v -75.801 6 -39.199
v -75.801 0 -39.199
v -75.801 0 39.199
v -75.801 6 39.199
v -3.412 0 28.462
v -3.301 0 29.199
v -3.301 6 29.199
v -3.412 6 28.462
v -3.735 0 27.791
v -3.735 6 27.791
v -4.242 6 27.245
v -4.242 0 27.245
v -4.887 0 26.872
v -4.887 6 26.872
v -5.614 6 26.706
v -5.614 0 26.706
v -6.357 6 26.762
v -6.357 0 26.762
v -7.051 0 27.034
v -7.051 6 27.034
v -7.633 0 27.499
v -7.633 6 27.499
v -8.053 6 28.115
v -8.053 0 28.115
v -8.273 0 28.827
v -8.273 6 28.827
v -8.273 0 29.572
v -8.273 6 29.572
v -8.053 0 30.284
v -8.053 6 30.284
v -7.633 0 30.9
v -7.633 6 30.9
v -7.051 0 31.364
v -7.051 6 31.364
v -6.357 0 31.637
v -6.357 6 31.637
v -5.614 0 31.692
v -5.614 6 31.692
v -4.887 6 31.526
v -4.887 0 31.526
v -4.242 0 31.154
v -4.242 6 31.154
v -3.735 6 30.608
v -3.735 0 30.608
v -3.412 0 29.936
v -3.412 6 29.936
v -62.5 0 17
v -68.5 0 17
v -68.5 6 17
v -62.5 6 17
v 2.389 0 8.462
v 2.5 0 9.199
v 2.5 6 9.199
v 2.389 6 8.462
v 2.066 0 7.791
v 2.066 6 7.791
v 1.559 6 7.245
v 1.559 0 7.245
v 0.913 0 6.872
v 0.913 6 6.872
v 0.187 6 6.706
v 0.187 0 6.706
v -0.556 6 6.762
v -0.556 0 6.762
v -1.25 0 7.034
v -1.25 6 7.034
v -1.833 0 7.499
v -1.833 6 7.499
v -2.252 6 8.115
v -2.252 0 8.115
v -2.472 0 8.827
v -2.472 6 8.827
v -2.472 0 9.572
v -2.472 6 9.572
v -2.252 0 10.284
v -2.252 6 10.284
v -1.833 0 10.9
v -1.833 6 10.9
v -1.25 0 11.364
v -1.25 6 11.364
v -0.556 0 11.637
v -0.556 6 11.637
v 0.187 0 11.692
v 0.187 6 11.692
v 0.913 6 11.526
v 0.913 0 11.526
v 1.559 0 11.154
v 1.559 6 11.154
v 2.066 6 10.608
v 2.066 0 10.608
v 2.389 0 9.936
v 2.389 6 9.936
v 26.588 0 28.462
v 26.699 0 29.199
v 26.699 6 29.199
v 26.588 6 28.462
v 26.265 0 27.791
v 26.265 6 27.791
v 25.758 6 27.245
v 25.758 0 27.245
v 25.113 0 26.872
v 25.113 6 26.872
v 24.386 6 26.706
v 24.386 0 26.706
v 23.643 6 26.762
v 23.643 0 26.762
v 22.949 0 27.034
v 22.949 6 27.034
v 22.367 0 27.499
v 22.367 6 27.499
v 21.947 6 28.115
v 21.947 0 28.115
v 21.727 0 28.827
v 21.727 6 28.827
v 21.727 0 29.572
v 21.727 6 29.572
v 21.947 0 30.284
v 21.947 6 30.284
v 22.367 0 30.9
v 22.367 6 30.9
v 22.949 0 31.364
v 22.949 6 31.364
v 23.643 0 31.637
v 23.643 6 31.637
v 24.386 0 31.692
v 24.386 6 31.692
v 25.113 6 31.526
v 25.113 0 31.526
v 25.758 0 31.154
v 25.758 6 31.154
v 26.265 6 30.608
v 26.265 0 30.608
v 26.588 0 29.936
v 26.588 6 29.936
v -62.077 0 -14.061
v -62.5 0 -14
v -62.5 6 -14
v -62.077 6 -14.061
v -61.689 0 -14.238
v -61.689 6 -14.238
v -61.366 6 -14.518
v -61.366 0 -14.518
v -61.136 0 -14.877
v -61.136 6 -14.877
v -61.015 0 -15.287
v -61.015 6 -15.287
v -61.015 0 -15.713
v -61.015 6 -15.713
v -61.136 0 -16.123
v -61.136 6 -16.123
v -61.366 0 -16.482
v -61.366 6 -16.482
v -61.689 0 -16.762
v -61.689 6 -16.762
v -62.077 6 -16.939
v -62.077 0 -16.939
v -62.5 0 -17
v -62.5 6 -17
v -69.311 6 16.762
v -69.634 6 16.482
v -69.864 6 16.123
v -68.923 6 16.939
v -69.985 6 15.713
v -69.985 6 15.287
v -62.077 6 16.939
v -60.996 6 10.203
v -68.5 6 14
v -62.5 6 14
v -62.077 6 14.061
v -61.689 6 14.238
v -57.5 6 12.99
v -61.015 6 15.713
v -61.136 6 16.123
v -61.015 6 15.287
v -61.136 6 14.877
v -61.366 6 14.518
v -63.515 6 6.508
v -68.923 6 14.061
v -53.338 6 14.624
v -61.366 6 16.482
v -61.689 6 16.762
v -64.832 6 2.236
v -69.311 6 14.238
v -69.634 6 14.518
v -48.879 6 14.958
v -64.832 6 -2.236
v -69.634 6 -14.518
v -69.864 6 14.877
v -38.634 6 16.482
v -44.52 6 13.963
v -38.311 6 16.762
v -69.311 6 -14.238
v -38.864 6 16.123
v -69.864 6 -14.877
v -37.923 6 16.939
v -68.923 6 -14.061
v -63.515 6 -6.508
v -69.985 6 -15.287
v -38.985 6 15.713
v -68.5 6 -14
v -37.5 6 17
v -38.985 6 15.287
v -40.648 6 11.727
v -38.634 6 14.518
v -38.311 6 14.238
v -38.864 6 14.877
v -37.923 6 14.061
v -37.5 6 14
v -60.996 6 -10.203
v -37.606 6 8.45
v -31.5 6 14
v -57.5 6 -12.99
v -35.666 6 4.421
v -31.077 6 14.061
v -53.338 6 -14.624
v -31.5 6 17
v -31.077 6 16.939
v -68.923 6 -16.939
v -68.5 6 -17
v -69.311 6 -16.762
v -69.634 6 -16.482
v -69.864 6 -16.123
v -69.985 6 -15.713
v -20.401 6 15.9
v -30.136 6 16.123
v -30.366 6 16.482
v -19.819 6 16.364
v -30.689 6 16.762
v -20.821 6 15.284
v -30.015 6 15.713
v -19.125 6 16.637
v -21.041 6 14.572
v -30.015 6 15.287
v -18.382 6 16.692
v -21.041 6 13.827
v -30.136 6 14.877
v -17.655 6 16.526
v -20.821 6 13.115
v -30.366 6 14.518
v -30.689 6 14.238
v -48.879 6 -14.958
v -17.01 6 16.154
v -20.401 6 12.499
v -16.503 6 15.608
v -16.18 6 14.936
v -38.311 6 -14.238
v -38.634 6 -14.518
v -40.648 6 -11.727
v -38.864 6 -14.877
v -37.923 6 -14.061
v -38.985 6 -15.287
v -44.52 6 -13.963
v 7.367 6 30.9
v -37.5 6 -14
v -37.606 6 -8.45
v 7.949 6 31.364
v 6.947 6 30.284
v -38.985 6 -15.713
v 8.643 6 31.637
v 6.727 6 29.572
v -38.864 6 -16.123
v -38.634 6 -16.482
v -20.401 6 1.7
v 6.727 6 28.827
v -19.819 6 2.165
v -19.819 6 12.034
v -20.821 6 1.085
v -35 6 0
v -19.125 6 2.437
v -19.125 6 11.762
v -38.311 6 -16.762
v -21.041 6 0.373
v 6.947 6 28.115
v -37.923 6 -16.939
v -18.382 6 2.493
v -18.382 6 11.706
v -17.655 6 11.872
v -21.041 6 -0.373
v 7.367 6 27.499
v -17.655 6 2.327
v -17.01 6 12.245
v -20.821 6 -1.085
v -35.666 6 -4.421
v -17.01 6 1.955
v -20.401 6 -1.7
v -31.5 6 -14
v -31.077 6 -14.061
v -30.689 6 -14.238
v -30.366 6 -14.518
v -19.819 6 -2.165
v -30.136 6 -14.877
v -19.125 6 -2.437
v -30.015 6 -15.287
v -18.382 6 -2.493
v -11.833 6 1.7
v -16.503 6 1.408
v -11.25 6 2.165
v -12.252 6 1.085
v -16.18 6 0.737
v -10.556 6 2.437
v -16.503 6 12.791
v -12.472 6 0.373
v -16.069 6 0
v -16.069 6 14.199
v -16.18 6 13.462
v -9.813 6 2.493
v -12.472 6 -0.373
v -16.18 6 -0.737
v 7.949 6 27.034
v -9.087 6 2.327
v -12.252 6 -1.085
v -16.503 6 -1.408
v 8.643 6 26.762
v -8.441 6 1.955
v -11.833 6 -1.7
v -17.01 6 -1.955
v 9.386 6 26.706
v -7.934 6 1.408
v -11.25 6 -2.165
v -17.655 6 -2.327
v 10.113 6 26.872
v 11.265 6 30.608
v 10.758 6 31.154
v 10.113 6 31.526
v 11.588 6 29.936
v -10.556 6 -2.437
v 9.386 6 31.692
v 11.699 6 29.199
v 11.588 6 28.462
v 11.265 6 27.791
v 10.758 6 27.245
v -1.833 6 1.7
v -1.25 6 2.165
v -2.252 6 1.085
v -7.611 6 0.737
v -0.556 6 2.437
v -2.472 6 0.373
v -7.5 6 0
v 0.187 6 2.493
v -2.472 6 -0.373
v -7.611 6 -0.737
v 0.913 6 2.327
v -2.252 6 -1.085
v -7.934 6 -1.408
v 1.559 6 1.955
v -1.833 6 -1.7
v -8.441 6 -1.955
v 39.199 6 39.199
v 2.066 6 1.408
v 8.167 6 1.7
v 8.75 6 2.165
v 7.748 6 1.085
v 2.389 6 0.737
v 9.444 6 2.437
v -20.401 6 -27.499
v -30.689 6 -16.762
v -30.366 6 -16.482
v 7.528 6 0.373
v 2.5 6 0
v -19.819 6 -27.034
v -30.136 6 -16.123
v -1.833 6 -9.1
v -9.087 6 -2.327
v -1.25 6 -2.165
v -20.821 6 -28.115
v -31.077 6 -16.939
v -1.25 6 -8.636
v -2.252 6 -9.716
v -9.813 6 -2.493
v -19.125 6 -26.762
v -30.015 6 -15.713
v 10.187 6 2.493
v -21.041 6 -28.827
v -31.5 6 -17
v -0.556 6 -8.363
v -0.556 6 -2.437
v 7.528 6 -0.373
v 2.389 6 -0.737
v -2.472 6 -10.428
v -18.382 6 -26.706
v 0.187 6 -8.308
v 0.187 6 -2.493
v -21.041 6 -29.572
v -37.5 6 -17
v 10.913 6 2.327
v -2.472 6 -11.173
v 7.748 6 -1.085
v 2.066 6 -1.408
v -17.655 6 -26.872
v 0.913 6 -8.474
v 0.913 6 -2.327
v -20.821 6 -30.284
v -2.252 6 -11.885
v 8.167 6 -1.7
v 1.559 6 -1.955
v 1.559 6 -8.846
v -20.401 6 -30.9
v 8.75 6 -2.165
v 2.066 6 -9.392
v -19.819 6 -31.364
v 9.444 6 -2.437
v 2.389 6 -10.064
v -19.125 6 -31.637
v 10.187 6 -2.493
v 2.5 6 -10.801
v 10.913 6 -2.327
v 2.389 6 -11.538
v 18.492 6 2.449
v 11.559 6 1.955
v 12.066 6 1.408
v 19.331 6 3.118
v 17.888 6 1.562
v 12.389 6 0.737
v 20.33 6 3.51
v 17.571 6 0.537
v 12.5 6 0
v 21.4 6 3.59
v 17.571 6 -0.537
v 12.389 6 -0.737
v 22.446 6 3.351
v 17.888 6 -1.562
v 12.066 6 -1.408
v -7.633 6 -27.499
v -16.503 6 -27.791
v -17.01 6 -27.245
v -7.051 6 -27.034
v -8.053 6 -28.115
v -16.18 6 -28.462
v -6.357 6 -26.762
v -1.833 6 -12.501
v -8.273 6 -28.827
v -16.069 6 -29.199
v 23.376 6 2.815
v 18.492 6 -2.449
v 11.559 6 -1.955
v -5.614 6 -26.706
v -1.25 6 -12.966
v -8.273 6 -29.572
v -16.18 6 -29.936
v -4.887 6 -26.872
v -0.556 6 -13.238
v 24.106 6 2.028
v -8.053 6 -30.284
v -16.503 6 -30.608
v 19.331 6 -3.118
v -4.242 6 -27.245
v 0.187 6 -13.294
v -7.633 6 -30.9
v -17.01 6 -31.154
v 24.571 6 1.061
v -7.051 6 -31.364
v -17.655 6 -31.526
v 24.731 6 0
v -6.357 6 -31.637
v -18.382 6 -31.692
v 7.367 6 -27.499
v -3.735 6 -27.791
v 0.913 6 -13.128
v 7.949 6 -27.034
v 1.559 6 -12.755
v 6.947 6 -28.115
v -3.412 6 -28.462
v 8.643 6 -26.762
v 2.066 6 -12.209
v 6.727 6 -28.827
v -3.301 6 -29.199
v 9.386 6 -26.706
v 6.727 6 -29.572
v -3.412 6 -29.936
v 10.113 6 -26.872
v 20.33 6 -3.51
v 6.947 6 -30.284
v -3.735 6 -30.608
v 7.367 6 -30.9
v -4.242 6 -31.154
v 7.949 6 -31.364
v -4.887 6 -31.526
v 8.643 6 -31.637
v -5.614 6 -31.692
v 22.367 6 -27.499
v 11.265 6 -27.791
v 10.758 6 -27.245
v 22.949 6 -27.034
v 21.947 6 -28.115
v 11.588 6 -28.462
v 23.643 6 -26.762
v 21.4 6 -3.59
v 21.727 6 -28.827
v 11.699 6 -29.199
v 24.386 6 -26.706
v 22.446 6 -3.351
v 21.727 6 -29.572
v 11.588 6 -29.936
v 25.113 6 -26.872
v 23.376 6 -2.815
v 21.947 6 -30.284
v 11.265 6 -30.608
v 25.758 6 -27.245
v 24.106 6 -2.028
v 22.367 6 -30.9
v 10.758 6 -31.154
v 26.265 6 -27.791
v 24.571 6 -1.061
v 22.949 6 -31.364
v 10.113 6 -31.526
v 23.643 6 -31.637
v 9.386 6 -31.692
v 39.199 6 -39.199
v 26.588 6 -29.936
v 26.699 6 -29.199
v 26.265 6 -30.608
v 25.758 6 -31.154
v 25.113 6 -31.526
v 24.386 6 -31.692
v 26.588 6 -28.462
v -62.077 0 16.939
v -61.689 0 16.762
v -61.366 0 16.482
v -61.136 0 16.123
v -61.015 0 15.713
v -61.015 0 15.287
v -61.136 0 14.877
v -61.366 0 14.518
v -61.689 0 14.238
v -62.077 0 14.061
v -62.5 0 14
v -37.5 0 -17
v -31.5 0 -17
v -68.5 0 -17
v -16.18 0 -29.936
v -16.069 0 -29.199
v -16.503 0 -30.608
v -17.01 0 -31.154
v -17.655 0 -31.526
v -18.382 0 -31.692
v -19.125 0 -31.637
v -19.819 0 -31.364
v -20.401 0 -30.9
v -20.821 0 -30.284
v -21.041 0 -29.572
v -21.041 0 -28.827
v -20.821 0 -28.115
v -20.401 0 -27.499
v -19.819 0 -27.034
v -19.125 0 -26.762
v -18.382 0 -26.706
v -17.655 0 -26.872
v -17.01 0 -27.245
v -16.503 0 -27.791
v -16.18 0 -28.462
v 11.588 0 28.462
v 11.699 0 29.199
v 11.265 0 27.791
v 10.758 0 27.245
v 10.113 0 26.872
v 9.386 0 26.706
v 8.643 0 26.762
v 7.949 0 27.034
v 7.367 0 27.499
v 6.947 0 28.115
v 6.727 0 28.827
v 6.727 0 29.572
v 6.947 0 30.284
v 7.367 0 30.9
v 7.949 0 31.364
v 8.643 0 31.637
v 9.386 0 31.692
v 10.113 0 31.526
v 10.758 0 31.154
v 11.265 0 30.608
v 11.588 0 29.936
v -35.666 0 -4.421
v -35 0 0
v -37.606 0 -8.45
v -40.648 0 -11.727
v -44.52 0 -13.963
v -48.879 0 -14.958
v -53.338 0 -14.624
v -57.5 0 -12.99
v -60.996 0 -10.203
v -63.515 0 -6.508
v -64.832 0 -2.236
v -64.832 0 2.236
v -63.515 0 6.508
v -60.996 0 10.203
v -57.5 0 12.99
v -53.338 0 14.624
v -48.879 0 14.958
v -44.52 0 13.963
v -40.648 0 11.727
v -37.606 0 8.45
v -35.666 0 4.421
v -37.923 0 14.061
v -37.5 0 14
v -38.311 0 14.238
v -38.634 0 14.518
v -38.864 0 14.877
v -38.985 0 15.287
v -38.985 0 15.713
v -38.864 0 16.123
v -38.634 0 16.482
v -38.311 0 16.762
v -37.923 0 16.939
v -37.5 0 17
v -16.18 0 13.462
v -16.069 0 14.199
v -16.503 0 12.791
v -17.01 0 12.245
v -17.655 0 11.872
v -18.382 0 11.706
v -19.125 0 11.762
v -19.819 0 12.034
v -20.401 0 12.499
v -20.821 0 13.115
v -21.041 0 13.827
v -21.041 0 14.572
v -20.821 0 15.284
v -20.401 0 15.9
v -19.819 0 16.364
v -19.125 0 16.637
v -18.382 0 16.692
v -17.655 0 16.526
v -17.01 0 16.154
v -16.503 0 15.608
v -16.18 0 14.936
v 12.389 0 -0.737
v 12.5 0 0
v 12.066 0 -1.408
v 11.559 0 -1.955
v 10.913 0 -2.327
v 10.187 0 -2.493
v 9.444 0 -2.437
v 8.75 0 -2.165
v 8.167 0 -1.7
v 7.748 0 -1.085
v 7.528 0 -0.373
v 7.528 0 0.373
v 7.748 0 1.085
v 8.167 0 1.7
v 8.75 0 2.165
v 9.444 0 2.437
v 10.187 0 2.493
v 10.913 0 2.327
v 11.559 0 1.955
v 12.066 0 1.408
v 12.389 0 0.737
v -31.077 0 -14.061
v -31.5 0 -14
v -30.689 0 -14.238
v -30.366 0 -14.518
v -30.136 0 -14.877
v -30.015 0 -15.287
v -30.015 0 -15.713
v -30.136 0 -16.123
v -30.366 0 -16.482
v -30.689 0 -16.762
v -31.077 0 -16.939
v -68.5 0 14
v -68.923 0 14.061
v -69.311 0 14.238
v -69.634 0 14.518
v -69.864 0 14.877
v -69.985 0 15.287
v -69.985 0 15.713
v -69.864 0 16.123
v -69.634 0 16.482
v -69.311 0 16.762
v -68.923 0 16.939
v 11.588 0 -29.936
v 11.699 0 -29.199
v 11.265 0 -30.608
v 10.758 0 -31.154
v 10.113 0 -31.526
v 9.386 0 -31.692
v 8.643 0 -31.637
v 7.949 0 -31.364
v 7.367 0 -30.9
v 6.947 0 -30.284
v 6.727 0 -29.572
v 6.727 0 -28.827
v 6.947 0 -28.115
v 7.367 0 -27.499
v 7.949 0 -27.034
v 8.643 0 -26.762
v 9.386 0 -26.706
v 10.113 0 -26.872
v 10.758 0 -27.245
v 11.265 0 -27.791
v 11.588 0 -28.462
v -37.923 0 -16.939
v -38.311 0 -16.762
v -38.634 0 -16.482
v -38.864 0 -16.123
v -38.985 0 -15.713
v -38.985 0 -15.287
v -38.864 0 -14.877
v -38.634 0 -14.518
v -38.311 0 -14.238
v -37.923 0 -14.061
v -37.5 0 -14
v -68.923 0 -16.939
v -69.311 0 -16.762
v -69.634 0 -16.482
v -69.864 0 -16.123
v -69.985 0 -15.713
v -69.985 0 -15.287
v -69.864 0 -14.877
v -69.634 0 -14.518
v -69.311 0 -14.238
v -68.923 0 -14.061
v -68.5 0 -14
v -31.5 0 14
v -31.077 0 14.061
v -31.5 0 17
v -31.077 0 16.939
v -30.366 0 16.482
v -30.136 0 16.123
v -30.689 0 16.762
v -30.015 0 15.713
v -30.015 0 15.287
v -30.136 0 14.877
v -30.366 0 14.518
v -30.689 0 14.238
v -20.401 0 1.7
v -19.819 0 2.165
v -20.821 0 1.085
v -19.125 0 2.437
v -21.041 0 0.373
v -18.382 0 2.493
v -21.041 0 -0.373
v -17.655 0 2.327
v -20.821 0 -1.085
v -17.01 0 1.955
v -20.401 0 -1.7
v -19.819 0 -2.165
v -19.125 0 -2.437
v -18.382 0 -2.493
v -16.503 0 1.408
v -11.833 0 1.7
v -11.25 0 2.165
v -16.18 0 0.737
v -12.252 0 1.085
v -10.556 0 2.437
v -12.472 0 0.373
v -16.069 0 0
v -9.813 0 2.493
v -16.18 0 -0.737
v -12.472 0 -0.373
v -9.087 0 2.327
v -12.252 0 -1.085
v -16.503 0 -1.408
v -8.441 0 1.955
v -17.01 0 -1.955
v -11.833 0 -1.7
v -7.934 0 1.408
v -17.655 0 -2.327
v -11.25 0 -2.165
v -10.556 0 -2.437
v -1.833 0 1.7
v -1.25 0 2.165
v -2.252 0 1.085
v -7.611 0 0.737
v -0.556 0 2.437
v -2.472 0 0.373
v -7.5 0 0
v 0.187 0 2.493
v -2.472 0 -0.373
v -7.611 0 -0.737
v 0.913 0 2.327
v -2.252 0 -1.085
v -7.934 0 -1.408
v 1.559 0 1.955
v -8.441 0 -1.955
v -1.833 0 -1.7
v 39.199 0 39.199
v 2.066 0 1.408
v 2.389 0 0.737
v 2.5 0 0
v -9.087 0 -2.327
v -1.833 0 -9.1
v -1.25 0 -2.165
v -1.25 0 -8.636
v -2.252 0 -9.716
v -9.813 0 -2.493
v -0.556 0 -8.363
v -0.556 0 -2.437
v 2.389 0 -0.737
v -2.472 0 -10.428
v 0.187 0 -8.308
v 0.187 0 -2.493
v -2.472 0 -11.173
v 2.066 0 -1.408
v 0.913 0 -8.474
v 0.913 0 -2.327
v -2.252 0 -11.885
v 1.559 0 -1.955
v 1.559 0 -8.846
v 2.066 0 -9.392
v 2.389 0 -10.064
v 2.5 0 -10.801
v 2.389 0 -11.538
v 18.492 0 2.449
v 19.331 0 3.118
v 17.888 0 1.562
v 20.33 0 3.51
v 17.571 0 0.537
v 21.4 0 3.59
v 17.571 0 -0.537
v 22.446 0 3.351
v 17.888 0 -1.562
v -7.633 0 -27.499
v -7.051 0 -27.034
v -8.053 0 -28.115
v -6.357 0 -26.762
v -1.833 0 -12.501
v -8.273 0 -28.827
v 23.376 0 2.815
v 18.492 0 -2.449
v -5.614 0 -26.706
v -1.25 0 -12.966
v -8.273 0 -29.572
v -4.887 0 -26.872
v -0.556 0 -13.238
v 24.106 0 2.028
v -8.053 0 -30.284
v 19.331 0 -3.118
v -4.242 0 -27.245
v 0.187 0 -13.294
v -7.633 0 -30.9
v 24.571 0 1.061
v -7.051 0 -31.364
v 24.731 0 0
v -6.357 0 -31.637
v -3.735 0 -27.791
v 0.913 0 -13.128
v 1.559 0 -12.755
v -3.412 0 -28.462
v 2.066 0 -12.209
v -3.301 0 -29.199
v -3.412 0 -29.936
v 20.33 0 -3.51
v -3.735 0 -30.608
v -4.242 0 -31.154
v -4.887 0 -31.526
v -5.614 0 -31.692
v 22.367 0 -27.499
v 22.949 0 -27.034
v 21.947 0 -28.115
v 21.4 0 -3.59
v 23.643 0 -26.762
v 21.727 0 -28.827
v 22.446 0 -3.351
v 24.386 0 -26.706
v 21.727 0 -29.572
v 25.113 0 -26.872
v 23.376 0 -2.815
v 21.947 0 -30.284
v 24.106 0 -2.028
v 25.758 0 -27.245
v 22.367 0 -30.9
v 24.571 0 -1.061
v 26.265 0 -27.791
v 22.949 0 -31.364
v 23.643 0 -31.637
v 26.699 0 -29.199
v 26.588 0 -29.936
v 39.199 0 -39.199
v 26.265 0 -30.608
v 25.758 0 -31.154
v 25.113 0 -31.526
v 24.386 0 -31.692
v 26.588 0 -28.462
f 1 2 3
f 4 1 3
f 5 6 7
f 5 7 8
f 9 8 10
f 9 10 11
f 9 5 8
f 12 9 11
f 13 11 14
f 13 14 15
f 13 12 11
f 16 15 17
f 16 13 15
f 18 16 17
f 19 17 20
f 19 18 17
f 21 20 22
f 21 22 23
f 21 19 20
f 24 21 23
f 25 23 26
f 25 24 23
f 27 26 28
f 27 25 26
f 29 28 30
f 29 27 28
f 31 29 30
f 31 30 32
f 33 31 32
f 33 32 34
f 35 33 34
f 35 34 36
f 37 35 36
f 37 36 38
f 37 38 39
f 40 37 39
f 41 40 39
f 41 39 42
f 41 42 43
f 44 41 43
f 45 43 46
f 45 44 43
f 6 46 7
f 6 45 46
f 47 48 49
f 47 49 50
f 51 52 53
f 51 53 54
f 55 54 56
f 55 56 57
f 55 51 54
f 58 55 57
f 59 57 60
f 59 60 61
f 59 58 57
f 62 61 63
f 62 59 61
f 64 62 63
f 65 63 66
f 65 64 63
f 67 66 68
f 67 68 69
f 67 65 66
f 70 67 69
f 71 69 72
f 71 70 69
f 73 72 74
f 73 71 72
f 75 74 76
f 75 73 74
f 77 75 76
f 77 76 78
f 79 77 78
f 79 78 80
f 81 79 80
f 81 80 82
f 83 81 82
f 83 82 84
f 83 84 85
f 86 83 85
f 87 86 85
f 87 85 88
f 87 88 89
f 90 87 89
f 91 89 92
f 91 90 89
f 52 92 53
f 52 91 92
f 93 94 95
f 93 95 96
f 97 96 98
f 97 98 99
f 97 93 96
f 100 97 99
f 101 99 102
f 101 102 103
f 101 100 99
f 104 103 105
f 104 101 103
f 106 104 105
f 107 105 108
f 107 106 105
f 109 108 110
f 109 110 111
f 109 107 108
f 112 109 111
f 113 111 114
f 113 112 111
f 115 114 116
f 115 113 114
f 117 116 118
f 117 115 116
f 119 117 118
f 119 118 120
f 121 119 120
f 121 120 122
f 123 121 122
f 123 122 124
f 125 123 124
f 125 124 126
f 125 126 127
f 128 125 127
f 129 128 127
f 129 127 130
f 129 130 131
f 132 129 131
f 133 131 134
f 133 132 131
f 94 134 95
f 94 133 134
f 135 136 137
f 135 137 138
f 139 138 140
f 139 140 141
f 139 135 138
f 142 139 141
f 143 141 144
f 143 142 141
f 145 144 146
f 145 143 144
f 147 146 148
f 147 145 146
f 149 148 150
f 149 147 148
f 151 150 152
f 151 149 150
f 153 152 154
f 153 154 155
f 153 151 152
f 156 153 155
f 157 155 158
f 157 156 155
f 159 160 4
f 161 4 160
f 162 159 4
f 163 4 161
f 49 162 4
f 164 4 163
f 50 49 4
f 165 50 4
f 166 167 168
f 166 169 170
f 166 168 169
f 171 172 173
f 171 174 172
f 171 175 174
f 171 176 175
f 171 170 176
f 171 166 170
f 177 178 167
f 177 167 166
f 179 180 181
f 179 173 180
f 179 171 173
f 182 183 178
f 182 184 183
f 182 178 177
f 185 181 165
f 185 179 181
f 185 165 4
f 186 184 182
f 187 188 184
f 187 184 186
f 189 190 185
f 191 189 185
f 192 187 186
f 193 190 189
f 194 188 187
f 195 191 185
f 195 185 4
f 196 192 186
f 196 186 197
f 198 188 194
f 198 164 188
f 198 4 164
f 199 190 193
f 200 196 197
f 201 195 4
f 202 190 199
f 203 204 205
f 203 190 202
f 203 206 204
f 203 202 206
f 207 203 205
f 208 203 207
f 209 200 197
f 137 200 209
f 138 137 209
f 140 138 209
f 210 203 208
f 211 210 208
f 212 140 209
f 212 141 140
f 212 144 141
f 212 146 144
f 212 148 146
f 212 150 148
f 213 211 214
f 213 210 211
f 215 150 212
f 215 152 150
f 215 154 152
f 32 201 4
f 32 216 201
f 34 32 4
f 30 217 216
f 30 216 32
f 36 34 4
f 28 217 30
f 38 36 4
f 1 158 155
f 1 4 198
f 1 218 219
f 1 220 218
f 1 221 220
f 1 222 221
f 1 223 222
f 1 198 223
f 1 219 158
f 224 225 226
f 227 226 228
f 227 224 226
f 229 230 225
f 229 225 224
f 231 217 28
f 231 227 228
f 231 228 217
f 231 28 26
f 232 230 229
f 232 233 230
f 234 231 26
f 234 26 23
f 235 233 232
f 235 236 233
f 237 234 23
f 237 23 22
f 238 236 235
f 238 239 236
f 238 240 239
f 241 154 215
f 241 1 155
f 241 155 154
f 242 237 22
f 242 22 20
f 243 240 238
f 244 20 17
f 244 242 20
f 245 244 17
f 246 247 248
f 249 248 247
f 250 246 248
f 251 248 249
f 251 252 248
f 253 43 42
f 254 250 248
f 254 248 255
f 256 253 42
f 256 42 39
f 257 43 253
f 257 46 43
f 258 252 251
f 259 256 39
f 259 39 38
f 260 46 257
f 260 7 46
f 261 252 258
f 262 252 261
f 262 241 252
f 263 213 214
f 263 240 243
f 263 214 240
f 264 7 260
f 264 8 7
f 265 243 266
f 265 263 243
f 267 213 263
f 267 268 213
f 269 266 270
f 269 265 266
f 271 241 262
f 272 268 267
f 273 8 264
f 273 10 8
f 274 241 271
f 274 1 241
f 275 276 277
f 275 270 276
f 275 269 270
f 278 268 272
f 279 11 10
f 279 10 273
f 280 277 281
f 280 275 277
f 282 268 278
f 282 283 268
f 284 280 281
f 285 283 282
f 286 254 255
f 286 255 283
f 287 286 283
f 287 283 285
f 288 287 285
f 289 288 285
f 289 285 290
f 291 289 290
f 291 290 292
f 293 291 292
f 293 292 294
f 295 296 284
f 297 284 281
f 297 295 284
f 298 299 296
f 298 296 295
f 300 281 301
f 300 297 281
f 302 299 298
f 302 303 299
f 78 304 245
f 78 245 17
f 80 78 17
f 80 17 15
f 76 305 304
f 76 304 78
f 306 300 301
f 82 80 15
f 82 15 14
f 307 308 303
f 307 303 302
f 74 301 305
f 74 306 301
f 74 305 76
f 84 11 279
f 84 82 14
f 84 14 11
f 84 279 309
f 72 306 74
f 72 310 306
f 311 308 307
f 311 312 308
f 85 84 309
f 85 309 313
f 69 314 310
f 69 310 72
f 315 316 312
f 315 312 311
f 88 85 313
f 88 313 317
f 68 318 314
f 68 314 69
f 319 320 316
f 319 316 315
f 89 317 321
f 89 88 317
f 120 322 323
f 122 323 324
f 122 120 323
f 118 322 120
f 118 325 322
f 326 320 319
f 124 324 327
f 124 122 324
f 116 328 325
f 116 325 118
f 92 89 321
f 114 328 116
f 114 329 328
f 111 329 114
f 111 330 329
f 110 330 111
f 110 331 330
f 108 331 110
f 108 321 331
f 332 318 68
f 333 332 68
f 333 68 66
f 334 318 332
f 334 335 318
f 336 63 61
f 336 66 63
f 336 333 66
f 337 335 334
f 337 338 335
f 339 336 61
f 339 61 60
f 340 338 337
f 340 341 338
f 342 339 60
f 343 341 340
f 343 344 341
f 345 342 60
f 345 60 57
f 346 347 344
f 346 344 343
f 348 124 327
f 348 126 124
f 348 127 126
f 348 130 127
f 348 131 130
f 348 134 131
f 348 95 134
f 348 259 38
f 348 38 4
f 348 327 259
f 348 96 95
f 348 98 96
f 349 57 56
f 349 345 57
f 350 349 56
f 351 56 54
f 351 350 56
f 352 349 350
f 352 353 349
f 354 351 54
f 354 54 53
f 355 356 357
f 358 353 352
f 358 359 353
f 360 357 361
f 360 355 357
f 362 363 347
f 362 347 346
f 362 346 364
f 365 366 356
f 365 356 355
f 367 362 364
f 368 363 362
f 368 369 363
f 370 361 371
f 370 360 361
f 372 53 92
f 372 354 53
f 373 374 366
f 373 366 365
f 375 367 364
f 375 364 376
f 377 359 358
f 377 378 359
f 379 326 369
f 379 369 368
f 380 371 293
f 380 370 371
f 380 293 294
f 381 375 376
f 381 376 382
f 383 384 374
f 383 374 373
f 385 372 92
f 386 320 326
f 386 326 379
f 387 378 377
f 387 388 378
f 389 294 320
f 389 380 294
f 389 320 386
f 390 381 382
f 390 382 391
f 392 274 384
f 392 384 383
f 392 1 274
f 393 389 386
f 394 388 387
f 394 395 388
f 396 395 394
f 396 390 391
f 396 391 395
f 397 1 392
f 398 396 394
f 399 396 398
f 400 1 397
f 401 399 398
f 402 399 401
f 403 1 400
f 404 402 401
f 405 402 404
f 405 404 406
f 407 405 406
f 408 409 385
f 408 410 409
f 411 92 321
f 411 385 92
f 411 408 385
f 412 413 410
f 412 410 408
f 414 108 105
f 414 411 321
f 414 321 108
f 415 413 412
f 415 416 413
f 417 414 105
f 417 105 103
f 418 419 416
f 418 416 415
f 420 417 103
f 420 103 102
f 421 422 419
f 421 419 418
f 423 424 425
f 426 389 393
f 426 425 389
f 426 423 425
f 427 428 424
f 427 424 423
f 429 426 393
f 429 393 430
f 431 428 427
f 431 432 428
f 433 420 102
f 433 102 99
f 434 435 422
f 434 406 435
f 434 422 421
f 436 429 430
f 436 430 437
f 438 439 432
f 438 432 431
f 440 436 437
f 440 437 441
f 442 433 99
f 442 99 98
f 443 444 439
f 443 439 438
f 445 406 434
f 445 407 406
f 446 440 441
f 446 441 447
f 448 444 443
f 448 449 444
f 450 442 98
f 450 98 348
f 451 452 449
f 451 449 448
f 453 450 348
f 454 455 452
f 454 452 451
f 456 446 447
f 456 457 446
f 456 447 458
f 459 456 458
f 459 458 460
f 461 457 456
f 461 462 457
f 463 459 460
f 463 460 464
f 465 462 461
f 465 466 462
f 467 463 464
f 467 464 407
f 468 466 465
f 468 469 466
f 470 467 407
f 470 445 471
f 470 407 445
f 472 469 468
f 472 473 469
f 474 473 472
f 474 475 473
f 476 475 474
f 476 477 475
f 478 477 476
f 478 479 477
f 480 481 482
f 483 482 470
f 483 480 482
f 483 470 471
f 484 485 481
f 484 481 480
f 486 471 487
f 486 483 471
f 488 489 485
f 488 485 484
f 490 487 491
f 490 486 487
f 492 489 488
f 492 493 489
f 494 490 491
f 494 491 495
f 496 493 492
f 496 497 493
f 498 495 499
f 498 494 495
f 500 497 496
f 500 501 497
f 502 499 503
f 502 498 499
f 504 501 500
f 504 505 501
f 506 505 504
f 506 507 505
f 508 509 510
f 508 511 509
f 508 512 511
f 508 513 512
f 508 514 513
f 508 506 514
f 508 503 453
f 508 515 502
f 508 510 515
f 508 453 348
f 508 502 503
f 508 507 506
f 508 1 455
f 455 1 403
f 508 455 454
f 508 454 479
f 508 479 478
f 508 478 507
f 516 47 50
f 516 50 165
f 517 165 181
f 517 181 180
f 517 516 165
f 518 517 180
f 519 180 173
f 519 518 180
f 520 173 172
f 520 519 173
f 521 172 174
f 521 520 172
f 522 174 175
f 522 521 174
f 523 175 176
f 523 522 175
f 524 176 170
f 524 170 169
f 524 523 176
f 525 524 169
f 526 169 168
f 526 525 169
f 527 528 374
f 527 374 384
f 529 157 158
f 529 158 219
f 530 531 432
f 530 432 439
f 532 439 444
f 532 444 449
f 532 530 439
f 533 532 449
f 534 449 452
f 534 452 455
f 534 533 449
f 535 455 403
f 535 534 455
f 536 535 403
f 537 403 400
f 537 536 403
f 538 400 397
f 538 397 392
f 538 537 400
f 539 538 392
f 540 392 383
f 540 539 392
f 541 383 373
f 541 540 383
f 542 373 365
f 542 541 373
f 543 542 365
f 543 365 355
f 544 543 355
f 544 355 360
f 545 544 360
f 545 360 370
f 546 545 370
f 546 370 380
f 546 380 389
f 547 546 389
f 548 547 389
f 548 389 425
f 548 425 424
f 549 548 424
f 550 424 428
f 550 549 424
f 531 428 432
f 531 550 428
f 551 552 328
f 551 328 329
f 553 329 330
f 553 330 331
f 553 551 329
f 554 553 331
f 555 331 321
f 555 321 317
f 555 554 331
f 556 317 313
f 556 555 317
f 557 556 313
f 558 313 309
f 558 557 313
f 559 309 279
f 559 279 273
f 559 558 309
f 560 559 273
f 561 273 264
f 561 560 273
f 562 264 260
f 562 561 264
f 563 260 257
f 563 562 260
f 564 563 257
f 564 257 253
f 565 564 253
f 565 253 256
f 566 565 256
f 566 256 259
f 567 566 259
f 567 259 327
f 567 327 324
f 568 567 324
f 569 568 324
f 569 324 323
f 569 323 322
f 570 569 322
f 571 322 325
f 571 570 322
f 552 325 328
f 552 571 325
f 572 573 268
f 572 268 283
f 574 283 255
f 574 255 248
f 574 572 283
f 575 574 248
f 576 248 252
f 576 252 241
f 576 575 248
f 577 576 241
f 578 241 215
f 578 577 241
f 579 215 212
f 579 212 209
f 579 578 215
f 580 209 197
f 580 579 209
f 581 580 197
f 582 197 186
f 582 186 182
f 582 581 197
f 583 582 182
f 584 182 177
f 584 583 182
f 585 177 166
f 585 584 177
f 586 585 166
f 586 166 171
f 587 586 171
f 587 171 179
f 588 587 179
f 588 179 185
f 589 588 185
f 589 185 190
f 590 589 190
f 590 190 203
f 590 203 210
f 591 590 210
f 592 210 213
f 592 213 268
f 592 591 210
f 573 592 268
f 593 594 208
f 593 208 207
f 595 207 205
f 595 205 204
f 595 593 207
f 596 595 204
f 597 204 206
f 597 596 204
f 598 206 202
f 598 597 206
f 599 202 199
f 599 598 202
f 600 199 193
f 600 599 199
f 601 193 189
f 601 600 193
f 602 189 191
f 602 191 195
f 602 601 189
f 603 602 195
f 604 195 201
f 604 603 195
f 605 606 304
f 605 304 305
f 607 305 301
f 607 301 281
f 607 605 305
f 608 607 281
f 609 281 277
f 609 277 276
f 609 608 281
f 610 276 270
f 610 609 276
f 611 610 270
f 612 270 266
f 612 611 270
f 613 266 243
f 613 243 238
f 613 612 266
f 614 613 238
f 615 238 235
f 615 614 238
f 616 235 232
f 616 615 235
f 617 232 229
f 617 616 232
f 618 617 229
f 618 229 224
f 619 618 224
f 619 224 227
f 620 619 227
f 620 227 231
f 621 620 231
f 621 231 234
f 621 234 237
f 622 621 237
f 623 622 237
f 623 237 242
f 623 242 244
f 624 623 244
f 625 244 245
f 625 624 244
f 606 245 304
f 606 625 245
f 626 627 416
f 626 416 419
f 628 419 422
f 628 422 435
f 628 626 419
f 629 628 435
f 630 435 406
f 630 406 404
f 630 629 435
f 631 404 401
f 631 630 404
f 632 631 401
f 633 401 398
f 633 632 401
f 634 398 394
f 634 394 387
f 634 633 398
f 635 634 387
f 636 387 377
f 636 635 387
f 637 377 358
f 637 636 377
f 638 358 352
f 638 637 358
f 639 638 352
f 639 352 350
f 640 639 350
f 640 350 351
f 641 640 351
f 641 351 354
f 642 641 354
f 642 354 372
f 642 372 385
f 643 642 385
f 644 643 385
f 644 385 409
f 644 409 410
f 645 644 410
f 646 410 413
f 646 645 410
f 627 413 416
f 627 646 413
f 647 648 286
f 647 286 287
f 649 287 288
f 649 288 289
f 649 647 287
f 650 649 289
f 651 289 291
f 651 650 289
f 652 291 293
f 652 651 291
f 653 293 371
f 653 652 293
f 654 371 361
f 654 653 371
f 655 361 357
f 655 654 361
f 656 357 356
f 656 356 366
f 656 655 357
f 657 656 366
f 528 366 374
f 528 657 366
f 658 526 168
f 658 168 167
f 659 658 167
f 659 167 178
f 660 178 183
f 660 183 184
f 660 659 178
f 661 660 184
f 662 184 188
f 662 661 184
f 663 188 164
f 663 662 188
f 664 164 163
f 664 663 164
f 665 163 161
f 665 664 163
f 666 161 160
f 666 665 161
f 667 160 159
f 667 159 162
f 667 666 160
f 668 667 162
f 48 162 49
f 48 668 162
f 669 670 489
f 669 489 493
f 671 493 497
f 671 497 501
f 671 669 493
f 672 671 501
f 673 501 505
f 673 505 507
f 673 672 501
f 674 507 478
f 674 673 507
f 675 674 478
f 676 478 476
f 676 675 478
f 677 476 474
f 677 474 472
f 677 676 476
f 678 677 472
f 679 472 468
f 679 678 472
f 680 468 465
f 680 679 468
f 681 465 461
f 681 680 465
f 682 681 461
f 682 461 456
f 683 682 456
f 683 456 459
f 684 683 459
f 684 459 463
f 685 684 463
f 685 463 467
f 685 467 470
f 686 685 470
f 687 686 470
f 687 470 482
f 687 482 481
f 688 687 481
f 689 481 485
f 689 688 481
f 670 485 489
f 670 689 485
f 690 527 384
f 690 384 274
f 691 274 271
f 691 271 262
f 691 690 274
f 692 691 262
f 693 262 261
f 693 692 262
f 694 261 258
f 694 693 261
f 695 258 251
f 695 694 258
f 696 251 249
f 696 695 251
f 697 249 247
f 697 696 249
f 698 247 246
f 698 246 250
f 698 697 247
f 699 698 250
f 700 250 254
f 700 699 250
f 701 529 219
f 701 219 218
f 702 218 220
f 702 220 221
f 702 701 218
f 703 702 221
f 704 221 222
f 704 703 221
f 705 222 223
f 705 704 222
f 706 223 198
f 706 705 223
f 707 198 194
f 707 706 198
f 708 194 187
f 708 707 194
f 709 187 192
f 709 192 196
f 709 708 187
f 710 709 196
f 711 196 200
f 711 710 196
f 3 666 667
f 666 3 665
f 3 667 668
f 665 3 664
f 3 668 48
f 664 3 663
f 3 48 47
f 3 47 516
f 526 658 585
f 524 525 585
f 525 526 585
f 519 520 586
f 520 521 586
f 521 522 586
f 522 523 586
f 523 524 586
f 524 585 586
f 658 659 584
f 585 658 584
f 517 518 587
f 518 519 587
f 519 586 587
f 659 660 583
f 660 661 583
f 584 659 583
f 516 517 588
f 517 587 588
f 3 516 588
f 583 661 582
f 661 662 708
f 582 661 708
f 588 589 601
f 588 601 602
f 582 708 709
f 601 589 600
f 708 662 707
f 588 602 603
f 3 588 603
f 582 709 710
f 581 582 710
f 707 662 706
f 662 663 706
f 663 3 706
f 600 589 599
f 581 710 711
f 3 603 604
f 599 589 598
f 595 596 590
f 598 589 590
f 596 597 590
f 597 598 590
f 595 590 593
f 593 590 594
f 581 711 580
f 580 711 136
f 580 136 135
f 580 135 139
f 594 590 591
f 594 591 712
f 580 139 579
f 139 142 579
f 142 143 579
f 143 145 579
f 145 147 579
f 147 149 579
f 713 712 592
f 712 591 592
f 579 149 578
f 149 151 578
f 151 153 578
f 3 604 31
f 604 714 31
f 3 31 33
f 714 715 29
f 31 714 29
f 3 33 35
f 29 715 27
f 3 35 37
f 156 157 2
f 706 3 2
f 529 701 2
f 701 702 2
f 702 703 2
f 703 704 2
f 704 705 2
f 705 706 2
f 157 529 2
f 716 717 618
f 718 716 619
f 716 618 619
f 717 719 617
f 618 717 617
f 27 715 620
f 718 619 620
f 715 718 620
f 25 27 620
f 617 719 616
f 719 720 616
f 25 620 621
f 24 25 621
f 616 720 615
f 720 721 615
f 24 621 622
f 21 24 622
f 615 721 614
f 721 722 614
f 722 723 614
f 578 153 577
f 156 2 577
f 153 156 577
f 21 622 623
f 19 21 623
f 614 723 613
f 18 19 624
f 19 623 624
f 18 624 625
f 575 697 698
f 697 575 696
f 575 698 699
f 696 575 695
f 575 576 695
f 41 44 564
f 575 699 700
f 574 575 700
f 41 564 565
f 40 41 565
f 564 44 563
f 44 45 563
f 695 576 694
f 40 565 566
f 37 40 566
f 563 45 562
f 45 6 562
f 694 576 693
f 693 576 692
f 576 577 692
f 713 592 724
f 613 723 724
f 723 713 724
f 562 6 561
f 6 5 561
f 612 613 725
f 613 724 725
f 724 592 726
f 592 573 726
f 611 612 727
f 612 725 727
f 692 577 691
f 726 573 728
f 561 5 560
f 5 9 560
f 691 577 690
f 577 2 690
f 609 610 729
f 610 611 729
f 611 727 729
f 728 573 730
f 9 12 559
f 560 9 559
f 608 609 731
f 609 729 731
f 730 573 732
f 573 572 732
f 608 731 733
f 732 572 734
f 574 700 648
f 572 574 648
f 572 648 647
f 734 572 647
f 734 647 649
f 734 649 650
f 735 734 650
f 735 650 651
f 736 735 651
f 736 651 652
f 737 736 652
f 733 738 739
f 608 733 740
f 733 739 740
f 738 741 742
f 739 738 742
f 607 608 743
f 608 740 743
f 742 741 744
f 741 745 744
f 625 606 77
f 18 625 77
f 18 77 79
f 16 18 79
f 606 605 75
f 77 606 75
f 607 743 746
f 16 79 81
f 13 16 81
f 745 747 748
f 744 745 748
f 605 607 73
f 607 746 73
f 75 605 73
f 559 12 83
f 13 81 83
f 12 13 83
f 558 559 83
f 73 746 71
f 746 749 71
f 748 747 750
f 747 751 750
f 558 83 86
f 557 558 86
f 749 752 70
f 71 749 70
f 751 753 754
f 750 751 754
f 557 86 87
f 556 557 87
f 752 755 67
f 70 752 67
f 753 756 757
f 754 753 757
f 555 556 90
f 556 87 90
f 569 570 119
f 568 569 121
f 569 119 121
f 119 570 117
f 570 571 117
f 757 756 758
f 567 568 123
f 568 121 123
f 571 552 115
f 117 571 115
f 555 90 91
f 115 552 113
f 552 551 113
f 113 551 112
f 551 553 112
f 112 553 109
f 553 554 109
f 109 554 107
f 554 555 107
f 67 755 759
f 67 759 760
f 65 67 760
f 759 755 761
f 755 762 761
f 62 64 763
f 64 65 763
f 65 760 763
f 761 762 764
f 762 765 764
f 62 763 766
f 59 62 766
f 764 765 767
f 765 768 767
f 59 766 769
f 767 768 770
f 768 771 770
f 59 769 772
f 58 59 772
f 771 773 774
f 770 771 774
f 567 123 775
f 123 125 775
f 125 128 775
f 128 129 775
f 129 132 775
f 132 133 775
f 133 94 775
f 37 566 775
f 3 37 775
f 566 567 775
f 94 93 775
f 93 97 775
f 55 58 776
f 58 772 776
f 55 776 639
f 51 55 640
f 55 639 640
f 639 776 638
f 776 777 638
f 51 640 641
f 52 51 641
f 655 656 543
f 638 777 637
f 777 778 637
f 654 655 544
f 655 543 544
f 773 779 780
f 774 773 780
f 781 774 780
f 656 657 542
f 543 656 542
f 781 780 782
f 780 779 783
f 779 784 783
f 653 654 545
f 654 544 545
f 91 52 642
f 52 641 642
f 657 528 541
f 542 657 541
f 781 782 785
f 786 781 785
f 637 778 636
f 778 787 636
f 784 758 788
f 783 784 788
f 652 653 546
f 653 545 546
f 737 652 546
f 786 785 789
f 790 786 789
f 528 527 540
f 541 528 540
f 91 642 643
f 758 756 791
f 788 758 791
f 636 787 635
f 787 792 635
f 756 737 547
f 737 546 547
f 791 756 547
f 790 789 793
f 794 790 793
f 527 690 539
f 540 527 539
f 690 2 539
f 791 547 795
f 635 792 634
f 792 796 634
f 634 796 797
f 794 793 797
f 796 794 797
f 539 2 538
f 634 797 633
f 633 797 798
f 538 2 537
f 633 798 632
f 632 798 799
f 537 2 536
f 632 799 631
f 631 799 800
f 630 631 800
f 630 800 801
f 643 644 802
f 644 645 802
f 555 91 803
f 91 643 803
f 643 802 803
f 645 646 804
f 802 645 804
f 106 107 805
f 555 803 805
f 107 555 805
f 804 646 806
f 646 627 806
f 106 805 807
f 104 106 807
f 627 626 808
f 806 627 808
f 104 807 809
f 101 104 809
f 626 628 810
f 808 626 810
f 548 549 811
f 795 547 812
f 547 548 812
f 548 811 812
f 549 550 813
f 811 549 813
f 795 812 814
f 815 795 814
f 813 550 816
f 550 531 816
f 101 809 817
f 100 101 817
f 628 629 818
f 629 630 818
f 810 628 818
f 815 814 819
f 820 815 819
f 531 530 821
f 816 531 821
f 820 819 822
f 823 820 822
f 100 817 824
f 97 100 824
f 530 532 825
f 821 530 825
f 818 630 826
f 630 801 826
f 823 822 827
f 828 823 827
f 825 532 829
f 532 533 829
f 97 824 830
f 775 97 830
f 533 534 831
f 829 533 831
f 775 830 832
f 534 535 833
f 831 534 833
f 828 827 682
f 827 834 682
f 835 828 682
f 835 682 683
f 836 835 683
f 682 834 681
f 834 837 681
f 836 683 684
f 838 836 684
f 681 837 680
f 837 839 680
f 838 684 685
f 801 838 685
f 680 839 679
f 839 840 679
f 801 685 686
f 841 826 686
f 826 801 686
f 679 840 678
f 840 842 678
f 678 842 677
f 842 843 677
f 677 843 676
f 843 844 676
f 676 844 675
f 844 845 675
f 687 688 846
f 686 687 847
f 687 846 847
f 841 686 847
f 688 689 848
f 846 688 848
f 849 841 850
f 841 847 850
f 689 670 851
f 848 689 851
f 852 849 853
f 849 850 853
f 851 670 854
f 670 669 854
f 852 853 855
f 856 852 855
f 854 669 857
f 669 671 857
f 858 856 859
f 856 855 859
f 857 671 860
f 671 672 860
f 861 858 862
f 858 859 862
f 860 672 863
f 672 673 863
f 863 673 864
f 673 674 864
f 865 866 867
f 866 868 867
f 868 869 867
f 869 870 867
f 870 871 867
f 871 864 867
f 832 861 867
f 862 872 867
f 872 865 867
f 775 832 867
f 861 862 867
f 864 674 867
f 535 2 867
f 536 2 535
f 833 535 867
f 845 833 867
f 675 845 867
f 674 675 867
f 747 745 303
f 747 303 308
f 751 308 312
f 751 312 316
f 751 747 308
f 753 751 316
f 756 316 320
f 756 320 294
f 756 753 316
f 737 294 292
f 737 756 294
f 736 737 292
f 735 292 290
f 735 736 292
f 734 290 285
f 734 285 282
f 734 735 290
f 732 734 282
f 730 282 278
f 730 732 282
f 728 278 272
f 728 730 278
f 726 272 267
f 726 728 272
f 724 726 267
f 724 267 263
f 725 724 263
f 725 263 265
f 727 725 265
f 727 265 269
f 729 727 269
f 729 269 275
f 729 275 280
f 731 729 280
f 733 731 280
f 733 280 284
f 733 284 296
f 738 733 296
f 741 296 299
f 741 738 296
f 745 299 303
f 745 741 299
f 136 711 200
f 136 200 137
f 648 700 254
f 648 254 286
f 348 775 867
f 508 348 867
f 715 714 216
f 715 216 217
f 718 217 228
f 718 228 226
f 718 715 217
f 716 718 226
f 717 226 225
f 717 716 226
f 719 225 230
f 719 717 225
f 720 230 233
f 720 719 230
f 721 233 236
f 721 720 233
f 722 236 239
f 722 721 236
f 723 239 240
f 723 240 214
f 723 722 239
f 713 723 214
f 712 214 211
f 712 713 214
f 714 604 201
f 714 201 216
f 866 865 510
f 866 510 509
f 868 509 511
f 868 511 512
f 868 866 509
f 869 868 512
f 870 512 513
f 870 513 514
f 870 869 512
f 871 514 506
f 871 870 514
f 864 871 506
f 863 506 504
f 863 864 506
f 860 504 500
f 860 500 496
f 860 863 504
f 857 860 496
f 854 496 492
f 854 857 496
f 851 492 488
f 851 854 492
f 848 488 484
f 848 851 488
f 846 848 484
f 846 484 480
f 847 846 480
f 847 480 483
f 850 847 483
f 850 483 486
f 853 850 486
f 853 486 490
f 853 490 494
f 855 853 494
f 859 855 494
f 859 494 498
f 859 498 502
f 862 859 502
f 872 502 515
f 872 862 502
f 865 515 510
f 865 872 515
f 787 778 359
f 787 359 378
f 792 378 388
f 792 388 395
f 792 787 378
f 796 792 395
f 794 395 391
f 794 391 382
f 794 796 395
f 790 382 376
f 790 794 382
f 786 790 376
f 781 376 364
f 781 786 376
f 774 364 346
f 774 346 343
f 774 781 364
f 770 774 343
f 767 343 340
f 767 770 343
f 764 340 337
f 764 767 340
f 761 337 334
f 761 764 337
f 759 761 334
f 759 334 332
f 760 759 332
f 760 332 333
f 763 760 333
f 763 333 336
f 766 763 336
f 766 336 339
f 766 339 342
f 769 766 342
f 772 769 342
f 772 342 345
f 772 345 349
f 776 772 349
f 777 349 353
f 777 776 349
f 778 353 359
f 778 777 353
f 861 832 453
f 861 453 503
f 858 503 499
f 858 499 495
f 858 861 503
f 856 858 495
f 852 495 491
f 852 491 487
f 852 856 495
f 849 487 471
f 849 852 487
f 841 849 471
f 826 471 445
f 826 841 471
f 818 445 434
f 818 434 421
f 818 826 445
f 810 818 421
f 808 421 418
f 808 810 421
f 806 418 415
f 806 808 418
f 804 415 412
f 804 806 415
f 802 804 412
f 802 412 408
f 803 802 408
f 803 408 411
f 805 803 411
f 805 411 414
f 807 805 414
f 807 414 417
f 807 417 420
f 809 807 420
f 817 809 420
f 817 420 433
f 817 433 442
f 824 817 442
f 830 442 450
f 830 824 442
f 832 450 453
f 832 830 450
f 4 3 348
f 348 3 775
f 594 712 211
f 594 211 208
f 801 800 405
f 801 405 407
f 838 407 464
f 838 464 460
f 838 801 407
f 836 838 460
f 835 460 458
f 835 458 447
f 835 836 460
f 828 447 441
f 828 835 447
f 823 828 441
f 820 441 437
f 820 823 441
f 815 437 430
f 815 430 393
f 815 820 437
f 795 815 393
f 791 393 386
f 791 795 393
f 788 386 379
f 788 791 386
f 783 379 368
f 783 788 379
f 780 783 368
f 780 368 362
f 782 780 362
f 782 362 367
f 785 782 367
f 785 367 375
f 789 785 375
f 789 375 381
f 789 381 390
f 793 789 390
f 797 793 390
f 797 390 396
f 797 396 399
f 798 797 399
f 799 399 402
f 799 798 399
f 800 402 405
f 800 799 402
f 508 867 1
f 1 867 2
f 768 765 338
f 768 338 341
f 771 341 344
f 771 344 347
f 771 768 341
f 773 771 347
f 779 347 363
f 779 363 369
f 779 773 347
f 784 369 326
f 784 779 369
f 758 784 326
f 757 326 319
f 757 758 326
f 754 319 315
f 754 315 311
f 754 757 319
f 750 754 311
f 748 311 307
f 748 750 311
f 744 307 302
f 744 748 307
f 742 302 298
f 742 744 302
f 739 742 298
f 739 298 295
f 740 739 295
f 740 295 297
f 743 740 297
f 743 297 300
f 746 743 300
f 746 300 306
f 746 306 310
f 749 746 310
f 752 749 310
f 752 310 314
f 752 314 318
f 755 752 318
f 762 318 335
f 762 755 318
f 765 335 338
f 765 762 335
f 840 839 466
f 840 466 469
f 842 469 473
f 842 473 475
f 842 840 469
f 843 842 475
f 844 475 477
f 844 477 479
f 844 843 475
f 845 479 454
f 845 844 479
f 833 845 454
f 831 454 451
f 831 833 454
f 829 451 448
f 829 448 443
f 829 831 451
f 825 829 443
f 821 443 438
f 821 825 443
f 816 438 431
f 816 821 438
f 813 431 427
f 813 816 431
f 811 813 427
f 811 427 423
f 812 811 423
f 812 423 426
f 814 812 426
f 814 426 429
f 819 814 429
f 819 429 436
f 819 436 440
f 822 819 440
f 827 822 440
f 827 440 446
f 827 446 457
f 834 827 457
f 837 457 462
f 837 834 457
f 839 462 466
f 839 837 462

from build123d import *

# Parameters (mm, degrees)
BOSS_EXTRUDE1_DEPTH = 6
SKETCH1_7_R         = 2.5
SKETCH1_7_R_2       = 3.6
SKETCH1_7_R_3       = 15
CUT_EXTRUDE3_DEPTH  = 6


with BuildPart() as part:
    # Sketch1 → Boss-Extrude1 (new body)
    with BuildSketch(Plane(origin=(0, 0, 0), x_dir=(1, 0, 0), z_dir=(0, 1, 0))):
        Polygon((39.199236391, -39.199236391), (39.199236391, 39.199236391), (-75.800763609, 39.199236391), (-75.800763609, -39.199236391), (-39.199236391, -39.199236391), align=None)
    extrude(amount=BOSS_EXTRUDE1_DEPTH)

    # Sketch1<7> → Cut-Extrude3 (cut)
    with BuildSketch(Plane(origin=(0, 0, 0), x_dir=(1, 0, 0), z_dir=(0, 1, 0))):
        with Locations((-18.568778226, 29.199236391)):
            Circle(SKETCH1_7_R)
        with Locations((-18.568778226, -14.199236391)):
            Circle(SKETCH1_7_R)
        with Locations((24.199236391, 29.199236391)):
            Circle(SKETCH1_7_R)
        with Locations((9.199236391, 29.199236391)):
            Circle(SKETCH1_7_R)
        with Locations((21.131221774, 0)):
            Circle(SKETCH1_7_R_2)
        Circle(SKETCH1_7_R)
        with Locations((-10, 0)):
            Circle(SKETCH1_7_R)
        with Locations((-18.568778226, 0)):
            Circle(SKETCH1_7_R)
        with Locations((10, 0)):
            Circle(SKETCH1_7_R)
        with Locations((-5.800763609, 29.199236391)):
            Circle(SKETCH1_7_R)
        with Locations((-5.800763609, -29.199236391)):
            Circle(SKETCH1_7_R)
        with Locations((24.199236391, -29.199236391)):
            Circle(SKETCH1_7_R)
        with Locations((9.199236391, -29.199236391)):
            Circle(SKETCH1_7_R)
        with Locations((0, -9.199236391)):
            Circle(SKETCH1_7_R)
        with Locations((0, 10.800763609)):
            Circle(SKETCH1_7_R)
        with Locations((-50, 0)):
            Circle(SKETCH1_7_R_3)
        with BuildLine():
            Line((-68.5, 14), (-62.5, 14))
            ThreePointArc((-62.5, 14), (-61, 15.5), (-62.5, 17))
            Line((-62.5, 17), (-68.5, 17))
            ThreePointArc((-68.5, 17), (-70, 15.5), (-68.5, 14))
        make_face()
        with BuildLine():
            Line((-37.5, 14), (-31.5, 14))
            ThreePointArc((-31.5, 14), (-30, 15.5), (-31.5, 17))
            Line((-31.5, 17), (-37.5, 17))
            ThreePointArc((-37.5, 17), (-39, 15.5), (-37.5, 14))
        make_face()
        with BuildLine():
            Line((-37.5, -17), (-31.5, -17))
            ThreePointArc((-31.5, -17), (-30, -15.5), (-31.5, -14))
            Line((-31.5, -14), (-37.5, -14))
            ThreePointArc((-37.5, -14), (-39, -15.5), (-37.5, -17))
        make_face()
        with BuildLine():
            Line((-68.5, -17), (-62.5, -17))
            ThreePointArc((-62.5, -17), (-61, -15.5), (-62.5, -14))
            Line((-62.5, -14), (-68.5, -14))
            ThreePointArc((-68.5, -14), (-70, -15.5), (-68.5, -17))
        make_face()
    extrude(amount=CUT_EXTRUDE3_DEPTH, mode=Mode.SUBTRACT)


solid = part.part
